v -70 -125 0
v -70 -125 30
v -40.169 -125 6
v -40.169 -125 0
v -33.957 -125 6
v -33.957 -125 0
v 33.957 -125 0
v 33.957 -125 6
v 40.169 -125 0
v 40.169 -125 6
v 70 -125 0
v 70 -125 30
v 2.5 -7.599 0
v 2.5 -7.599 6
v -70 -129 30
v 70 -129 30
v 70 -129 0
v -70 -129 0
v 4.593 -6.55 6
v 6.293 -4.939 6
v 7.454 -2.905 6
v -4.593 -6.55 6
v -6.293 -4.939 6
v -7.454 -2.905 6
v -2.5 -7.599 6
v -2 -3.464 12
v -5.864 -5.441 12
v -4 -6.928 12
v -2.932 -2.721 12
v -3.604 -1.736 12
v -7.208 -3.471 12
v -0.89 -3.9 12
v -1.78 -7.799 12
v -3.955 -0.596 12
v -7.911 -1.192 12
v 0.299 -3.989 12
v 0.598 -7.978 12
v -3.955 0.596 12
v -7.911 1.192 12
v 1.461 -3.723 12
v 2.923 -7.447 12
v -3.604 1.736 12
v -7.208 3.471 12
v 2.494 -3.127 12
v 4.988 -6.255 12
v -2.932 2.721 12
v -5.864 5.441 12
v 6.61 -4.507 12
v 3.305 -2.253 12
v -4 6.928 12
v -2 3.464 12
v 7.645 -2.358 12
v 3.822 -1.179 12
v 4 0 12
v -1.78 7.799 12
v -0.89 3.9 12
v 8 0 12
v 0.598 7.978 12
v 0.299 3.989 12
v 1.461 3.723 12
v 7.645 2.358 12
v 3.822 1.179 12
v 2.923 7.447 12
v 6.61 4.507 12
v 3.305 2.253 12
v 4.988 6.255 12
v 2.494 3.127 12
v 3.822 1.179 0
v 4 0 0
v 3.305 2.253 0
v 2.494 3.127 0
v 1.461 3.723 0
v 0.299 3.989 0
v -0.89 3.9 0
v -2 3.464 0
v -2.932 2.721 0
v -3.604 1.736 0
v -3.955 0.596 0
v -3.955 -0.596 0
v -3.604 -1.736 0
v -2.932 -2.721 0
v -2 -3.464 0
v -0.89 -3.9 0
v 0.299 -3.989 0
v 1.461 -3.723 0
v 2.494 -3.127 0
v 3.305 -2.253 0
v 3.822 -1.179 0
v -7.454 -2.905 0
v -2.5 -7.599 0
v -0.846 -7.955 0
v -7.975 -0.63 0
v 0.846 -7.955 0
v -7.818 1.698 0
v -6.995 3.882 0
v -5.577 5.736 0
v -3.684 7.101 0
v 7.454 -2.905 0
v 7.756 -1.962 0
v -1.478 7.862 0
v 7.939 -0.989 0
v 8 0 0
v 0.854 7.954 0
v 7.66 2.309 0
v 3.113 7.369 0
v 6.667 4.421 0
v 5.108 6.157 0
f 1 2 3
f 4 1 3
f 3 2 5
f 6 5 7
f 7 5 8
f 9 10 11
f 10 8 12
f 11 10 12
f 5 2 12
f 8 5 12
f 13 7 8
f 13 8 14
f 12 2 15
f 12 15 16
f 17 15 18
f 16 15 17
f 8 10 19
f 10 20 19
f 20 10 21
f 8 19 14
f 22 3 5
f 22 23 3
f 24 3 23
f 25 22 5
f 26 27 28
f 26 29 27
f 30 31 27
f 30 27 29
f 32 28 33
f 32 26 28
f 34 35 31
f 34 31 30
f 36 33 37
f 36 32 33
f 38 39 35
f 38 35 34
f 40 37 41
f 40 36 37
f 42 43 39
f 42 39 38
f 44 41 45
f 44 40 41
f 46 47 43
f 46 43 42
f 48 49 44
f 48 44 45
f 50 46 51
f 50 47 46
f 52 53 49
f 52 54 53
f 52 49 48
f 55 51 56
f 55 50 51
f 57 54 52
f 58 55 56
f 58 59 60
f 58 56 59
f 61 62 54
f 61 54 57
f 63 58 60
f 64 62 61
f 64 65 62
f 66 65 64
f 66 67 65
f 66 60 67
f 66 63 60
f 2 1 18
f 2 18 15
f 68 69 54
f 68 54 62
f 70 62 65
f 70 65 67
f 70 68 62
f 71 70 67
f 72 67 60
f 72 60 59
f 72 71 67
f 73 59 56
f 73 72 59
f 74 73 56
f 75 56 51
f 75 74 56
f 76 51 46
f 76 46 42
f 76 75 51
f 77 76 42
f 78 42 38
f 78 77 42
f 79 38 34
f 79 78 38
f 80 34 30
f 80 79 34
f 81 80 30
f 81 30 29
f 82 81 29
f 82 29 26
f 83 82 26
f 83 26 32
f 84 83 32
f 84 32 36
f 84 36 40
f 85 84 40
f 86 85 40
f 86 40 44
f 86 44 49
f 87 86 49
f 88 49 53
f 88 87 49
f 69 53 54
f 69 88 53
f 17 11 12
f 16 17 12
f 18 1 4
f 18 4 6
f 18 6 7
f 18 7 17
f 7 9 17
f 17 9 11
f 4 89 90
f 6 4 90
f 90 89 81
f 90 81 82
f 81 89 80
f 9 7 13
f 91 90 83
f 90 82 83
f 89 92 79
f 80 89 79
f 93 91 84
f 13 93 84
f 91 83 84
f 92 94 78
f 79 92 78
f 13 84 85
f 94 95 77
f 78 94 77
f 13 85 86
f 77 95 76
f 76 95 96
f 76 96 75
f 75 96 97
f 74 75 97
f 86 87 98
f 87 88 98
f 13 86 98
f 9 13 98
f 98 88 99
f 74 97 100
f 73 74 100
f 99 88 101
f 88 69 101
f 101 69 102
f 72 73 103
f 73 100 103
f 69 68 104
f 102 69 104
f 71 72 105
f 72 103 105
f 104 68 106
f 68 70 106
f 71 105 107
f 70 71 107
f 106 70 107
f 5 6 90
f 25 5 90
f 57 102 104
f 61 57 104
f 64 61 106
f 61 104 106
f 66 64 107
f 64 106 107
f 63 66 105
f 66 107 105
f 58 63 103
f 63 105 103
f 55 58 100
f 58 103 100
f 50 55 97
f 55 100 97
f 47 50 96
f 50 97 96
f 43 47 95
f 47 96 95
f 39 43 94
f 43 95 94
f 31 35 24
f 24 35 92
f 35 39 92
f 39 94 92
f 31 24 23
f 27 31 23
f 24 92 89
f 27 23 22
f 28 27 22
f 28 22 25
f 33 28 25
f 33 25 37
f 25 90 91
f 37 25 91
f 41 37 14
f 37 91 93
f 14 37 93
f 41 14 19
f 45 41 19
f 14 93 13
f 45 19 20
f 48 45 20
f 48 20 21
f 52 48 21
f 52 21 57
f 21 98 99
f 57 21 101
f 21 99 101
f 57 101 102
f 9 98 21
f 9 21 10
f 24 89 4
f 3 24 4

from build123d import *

# Parameters (mm, degrees)
SKETCH_3_R         = 8
SKETCH_3_R_2       = 4
EXTRUDE_716_DEPTH  = 12
EXTRUDE_1137_DEPTH = 6
SKETCH_7_W         = 140
SKETCH_7_H         = 30
EXTRUDE_1364_DEPTH = 4


with BuildPart() as part:
    # 草图3 → Extrude 716 (new body)
    with BuildSketch(Plane.XY):
        Circle(SKETCH_3_R)
        Circle(SKETCH_3_R_2, mode=Mode.SUBTRACT)
    extrude(amount=EXTRUDE_716_DEPTH)

    # 草图6 → Extrude 1137 (add)
    with BuildSketch(Plane.XY):
        with BuildLine():
            Line((-40.169068564, -125), (-33.957411481, -125))
            Line((-33.957411481, -125), (-2.5, -7.599342077))
            ThreePointArc((-2.5, -7.599342077), (-5.502602373, -5.807010171), (-7.45385736, -2.905169608))
            Line((-7.45385736, -2.905169608), (-40.169068564, -125))
        make_face()
    extrude_1137 = extrude(amount=EXTRUDE_1137_DEPTH)

    # Mirror 1200: Extrude 1137 across plane
    add(extrude_1137.mirror(Plane(origin=(0, 0, 0), x_dir=(0, 0, 1), z_dir=(1, 0, 0))))

    # 草图7 → Extrude 1364 (add)
    with BuildSketch(Plane.XZ.offset(125)):
        with Locations((0, 15)):
            Rectangle(SKETCH_7_W, SKETCH_7_H)
    extrude(amount=EXTRUDE_1364_DEPTH)


solid = part.part
